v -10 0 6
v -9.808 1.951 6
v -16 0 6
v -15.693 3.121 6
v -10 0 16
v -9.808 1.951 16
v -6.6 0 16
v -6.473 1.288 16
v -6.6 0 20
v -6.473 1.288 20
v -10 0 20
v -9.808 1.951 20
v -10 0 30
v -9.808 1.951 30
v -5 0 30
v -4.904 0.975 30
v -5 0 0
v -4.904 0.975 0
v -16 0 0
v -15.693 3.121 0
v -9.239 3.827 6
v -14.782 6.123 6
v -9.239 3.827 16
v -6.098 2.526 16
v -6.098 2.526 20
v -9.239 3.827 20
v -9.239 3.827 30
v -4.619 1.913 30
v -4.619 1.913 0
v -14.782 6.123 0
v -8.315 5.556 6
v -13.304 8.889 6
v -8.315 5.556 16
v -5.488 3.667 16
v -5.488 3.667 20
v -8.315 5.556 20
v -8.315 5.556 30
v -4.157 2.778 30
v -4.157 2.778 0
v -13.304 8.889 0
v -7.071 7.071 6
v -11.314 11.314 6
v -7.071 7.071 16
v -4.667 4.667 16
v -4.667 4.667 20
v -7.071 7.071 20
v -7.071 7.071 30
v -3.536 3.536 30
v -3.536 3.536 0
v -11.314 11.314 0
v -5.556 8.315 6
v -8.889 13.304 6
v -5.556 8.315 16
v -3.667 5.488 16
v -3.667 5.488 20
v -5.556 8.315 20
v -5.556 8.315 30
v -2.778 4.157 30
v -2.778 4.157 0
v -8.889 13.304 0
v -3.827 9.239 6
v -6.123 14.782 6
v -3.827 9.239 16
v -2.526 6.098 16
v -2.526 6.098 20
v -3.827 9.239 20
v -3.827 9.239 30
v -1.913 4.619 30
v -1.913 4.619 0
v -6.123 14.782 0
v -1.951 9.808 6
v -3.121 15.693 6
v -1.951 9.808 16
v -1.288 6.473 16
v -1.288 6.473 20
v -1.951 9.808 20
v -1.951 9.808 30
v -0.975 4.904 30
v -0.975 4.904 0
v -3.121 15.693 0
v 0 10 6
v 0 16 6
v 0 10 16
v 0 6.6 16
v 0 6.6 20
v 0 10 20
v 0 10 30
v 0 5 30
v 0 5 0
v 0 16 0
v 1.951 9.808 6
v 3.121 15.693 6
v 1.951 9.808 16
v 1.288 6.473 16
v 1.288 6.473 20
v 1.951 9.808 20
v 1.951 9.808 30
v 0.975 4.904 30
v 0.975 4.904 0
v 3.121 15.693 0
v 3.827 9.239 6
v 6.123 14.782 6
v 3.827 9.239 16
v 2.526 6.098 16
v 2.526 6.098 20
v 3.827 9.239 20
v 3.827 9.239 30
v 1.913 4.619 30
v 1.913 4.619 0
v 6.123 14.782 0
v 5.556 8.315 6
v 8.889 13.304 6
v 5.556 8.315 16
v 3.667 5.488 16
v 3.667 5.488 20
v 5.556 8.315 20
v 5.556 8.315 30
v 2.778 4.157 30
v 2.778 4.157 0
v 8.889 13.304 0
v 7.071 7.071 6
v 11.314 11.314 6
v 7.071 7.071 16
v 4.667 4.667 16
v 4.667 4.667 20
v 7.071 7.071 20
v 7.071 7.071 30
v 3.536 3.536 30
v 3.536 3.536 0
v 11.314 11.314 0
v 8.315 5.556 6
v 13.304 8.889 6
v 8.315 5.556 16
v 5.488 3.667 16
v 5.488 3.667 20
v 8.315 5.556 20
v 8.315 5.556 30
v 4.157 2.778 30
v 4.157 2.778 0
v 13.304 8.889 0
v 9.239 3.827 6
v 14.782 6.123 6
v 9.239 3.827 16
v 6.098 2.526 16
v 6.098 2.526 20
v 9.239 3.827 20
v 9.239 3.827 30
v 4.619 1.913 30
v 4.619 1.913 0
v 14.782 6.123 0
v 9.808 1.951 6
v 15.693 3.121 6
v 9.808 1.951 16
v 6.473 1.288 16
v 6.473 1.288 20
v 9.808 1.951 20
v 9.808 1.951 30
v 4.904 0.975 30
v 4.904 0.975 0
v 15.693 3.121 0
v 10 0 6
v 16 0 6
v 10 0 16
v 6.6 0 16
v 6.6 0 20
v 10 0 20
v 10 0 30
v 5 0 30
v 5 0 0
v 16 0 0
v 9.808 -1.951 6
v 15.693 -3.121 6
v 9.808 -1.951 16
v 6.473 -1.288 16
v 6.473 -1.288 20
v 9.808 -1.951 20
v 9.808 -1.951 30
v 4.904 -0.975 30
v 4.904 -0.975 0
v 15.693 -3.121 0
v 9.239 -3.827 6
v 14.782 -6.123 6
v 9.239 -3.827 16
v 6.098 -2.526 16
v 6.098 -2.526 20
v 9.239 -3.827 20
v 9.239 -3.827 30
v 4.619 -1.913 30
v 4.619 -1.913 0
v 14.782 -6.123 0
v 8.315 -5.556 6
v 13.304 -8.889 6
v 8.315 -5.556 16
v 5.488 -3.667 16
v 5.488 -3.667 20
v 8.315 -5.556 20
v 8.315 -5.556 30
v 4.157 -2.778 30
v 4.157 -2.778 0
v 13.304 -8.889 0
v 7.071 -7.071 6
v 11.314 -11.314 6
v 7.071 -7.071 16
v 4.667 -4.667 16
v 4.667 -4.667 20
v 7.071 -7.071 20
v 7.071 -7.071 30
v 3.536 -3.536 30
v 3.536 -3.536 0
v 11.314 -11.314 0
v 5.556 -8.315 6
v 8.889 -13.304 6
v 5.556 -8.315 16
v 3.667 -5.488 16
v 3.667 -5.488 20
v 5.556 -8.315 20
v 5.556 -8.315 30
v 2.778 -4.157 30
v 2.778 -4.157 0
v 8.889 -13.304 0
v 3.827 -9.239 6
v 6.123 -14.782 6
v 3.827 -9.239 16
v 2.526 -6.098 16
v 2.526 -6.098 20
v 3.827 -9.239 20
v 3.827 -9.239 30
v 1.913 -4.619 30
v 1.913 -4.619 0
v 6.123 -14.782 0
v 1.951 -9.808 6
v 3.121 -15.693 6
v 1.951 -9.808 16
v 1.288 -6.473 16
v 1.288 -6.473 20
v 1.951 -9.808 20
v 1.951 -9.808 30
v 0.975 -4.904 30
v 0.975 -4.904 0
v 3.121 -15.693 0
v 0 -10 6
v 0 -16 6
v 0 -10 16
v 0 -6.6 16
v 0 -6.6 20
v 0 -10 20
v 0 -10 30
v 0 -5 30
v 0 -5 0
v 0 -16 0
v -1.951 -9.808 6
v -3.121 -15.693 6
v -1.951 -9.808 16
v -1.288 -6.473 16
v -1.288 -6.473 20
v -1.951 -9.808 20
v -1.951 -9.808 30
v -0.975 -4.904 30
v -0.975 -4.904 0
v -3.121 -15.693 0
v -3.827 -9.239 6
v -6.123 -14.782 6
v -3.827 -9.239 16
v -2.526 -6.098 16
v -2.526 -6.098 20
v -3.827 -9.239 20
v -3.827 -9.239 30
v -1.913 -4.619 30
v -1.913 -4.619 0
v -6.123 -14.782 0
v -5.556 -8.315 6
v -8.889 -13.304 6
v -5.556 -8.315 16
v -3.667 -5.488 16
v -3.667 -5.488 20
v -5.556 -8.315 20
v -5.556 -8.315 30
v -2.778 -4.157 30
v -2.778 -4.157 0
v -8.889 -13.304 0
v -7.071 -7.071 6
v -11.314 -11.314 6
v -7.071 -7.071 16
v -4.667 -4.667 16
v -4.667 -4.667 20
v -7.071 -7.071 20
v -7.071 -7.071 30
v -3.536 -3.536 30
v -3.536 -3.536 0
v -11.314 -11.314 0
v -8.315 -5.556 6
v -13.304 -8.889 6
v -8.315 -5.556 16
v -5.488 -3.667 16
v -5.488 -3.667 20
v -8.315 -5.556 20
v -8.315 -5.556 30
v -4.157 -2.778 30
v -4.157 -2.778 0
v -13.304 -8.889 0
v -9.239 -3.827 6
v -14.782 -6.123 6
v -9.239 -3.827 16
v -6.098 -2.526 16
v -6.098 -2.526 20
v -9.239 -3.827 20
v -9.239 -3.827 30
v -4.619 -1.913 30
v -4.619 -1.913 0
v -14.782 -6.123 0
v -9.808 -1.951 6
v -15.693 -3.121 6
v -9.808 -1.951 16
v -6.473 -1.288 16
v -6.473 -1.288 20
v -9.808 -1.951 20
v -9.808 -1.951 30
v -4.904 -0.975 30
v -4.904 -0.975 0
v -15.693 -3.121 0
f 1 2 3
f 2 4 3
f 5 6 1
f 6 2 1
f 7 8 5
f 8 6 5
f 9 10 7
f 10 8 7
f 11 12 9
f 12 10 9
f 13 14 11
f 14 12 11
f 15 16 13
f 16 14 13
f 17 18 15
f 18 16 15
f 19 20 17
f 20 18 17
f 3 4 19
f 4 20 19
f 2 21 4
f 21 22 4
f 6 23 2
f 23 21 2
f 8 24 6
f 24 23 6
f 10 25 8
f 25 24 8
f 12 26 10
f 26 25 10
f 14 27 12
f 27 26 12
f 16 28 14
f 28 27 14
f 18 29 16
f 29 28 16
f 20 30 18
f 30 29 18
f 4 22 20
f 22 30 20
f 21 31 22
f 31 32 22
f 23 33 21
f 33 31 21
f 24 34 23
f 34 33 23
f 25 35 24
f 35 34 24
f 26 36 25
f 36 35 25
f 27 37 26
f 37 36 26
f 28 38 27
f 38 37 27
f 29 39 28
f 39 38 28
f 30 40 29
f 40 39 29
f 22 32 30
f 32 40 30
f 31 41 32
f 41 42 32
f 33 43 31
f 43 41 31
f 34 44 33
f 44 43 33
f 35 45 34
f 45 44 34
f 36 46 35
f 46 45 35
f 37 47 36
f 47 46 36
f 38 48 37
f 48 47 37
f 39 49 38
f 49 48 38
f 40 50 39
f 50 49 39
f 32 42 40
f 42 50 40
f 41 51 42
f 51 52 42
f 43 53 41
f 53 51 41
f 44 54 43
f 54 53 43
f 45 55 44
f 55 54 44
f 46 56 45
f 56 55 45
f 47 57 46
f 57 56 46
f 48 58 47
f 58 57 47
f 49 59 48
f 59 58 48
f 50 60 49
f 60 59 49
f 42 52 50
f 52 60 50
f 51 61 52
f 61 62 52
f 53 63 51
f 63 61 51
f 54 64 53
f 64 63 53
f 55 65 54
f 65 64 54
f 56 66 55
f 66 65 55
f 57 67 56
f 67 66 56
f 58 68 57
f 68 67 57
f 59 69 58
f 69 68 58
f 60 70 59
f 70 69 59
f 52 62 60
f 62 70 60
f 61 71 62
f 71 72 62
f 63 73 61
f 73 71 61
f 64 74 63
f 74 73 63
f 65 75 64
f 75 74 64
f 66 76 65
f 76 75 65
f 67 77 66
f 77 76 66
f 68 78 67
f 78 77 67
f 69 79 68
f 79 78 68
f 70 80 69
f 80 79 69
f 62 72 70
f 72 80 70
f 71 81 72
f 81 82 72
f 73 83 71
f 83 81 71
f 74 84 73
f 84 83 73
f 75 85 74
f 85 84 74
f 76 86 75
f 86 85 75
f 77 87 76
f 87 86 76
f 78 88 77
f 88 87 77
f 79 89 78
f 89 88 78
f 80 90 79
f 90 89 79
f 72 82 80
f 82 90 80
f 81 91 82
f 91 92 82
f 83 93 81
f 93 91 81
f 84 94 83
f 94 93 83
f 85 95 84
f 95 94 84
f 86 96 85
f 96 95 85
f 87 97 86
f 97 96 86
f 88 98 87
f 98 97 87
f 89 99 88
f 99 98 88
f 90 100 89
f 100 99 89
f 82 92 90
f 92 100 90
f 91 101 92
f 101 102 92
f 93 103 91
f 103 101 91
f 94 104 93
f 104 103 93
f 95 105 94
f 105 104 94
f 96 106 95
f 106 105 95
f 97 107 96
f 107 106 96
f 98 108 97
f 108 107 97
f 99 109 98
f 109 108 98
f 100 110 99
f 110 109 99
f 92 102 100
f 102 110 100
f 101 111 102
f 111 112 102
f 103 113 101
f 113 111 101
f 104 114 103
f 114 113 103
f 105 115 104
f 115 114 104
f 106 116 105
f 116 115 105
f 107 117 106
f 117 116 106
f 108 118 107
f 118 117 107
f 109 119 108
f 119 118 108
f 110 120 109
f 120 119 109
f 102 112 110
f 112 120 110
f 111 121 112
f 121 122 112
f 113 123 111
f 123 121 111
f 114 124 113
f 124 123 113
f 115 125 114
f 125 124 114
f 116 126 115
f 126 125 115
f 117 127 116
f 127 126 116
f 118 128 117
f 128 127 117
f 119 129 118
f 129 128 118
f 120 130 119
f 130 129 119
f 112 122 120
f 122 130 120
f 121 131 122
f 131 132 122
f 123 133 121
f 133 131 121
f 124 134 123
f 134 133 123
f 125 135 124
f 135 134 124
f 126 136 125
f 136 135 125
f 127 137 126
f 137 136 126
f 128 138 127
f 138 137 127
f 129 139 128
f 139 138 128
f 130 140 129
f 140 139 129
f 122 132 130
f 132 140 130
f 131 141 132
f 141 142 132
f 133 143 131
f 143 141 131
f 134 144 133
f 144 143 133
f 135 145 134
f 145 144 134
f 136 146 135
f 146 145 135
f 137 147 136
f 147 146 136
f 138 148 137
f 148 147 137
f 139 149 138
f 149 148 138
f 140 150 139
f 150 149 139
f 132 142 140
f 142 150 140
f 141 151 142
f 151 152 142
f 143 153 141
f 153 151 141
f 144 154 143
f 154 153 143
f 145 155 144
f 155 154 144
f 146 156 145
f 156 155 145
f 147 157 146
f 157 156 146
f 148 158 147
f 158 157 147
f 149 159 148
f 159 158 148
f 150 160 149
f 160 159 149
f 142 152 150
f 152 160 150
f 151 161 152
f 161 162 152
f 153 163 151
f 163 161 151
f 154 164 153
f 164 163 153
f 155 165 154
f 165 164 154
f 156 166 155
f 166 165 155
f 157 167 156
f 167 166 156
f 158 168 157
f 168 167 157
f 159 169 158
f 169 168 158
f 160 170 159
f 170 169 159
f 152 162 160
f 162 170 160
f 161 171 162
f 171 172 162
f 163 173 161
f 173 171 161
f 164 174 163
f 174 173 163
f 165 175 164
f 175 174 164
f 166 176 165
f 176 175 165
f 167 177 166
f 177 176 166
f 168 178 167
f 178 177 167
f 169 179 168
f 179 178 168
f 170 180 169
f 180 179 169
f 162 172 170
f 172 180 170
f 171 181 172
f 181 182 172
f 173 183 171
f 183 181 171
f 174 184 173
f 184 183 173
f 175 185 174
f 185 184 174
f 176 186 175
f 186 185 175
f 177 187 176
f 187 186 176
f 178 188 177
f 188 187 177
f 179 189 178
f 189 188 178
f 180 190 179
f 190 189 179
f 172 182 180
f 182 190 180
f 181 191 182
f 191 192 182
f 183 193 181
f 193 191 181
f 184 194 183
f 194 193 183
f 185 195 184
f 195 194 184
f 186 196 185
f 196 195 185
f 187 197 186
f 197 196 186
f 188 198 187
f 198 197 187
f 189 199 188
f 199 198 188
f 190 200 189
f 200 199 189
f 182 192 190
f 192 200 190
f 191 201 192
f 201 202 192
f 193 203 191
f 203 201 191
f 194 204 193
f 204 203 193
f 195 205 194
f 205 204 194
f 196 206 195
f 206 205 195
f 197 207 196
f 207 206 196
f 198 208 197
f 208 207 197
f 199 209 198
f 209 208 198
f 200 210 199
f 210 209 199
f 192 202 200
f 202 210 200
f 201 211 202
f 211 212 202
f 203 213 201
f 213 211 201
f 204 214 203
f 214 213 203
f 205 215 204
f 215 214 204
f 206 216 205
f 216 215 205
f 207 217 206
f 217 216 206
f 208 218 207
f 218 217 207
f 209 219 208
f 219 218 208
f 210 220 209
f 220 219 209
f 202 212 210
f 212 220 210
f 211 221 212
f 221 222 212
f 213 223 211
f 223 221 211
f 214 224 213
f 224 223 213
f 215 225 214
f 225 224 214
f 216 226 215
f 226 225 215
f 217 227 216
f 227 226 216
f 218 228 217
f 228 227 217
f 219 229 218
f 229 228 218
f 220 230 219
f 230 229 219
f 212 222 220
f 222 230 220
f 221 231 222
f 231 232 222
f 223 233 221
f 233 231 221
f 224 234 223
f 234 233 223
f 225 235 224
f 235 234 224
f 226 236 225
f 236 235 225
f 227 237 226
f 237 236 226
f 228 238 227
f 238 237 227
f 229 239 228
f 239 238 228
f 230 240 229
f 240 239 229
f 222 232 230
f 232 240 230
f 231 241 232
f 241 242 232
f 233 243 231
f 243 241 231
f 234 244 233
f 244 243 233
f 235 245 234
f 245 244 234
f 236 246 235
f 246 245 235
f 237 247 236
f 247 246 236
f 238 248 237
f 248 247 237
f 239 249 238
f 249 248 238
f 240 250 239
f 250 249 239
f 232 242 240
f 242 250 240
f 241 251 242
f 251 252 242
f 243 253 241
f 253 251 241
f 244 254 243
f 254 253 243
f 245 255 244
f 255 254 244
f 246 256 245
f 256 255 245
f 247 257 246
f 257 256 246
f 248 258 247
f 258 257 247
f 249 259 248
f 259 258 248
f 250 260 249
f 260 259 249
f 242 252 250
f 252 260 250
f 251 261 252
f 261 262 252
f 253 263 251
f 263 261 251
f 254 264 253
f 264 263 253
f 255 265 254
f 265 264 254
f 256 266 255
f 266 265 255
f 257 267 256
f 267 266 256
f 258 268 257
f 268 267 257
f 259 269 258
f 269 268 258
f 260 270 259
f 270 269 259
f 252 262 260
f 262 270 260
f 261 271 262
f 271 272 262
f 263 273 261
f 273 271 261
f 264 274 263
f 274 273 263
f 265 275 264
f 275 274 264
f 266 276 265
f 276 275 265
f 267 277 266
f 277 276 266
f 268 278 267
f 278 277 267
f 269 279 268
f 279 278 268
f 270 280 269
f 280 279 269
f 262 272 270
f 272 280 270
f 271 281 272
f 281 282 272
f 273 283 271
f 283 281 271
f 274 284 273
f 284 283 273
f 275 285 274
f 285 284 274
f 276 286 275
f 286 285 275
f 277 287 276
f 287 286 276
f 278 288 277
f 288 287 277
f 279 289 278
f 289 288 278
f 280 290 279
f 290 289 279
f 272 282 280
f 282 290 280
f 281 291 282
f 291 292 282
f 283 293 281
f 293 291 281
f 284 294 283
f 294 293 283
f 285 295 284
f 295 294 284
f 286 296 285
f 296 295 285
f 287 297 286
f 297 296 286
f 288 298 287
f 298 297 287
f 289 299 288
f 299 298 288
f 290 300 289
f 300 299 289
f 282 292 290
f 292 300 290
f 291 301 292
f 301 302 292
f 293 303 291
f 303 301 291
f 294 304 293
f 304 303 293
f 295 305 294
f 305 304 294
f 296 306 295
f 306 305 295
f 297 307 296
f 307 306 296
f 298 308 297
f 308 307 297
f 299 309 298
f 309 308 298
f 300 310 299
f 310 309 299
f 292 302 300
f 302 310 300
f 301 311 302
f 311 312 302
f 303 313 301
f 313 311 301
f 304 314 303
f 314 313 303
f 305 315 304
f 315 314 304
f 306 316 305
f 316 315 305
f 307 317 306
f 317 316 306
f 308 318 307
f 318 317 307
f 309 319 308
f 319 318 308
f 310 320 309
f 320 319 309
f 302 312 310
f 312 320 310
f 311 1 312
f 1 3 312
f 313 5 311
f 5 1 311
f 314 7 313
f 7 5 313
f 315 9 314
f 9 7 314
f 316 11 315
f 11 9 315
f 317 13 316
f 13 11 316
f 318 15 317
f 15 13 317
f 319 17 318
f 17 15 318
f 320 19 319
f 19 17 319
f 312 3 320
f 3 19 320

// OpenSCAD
$fn = 32;

// ----------------------------------------------------------------------
// Grooved revolve: flanged, bore R5
// ----------------------------------------------------------------------

// --- parameters (mm) ---
bore_r = 5;               // bore radius
outer_r = 10;             // outer radius of the body
total_h = 30;             // overall height, Z
wall = 5;                 // radial wall thickness
groove_w = 4;             // groove width
groove_d = 3.4;           // groove depth
grooves = 1;              // number of outer grooves
flange_r = 16;            // flange radius
flange_h = 6;             // flange height
fit_tol = 0.02;           // declared fit tolerance (prompt contract)
free_tol = 0.2;           // declared free tolerance (prompt contract)

bbox_x = 2 * flange_r;  // full diameter
bore_d = 2 * bore_r;  // bore diameter
body_d = 2 * outer_r;  // body diameter
flange_d = 2 * flange_r;  // flange diameter
revolve_angle = 360;  // full turn around the Z axis

profile = [[5, 0], [10, 0], [16, 0], [16, 6], [10, 6], [10, 16], [6.6, 16], [6.6, 20], [10, 20], [10, 30], [5, 30]];  // primary outline, 11 points, counter clockwise

// --- the one profile operation ---
rotate_extrude(angle = revolve_angle) polygon(points = profile);
